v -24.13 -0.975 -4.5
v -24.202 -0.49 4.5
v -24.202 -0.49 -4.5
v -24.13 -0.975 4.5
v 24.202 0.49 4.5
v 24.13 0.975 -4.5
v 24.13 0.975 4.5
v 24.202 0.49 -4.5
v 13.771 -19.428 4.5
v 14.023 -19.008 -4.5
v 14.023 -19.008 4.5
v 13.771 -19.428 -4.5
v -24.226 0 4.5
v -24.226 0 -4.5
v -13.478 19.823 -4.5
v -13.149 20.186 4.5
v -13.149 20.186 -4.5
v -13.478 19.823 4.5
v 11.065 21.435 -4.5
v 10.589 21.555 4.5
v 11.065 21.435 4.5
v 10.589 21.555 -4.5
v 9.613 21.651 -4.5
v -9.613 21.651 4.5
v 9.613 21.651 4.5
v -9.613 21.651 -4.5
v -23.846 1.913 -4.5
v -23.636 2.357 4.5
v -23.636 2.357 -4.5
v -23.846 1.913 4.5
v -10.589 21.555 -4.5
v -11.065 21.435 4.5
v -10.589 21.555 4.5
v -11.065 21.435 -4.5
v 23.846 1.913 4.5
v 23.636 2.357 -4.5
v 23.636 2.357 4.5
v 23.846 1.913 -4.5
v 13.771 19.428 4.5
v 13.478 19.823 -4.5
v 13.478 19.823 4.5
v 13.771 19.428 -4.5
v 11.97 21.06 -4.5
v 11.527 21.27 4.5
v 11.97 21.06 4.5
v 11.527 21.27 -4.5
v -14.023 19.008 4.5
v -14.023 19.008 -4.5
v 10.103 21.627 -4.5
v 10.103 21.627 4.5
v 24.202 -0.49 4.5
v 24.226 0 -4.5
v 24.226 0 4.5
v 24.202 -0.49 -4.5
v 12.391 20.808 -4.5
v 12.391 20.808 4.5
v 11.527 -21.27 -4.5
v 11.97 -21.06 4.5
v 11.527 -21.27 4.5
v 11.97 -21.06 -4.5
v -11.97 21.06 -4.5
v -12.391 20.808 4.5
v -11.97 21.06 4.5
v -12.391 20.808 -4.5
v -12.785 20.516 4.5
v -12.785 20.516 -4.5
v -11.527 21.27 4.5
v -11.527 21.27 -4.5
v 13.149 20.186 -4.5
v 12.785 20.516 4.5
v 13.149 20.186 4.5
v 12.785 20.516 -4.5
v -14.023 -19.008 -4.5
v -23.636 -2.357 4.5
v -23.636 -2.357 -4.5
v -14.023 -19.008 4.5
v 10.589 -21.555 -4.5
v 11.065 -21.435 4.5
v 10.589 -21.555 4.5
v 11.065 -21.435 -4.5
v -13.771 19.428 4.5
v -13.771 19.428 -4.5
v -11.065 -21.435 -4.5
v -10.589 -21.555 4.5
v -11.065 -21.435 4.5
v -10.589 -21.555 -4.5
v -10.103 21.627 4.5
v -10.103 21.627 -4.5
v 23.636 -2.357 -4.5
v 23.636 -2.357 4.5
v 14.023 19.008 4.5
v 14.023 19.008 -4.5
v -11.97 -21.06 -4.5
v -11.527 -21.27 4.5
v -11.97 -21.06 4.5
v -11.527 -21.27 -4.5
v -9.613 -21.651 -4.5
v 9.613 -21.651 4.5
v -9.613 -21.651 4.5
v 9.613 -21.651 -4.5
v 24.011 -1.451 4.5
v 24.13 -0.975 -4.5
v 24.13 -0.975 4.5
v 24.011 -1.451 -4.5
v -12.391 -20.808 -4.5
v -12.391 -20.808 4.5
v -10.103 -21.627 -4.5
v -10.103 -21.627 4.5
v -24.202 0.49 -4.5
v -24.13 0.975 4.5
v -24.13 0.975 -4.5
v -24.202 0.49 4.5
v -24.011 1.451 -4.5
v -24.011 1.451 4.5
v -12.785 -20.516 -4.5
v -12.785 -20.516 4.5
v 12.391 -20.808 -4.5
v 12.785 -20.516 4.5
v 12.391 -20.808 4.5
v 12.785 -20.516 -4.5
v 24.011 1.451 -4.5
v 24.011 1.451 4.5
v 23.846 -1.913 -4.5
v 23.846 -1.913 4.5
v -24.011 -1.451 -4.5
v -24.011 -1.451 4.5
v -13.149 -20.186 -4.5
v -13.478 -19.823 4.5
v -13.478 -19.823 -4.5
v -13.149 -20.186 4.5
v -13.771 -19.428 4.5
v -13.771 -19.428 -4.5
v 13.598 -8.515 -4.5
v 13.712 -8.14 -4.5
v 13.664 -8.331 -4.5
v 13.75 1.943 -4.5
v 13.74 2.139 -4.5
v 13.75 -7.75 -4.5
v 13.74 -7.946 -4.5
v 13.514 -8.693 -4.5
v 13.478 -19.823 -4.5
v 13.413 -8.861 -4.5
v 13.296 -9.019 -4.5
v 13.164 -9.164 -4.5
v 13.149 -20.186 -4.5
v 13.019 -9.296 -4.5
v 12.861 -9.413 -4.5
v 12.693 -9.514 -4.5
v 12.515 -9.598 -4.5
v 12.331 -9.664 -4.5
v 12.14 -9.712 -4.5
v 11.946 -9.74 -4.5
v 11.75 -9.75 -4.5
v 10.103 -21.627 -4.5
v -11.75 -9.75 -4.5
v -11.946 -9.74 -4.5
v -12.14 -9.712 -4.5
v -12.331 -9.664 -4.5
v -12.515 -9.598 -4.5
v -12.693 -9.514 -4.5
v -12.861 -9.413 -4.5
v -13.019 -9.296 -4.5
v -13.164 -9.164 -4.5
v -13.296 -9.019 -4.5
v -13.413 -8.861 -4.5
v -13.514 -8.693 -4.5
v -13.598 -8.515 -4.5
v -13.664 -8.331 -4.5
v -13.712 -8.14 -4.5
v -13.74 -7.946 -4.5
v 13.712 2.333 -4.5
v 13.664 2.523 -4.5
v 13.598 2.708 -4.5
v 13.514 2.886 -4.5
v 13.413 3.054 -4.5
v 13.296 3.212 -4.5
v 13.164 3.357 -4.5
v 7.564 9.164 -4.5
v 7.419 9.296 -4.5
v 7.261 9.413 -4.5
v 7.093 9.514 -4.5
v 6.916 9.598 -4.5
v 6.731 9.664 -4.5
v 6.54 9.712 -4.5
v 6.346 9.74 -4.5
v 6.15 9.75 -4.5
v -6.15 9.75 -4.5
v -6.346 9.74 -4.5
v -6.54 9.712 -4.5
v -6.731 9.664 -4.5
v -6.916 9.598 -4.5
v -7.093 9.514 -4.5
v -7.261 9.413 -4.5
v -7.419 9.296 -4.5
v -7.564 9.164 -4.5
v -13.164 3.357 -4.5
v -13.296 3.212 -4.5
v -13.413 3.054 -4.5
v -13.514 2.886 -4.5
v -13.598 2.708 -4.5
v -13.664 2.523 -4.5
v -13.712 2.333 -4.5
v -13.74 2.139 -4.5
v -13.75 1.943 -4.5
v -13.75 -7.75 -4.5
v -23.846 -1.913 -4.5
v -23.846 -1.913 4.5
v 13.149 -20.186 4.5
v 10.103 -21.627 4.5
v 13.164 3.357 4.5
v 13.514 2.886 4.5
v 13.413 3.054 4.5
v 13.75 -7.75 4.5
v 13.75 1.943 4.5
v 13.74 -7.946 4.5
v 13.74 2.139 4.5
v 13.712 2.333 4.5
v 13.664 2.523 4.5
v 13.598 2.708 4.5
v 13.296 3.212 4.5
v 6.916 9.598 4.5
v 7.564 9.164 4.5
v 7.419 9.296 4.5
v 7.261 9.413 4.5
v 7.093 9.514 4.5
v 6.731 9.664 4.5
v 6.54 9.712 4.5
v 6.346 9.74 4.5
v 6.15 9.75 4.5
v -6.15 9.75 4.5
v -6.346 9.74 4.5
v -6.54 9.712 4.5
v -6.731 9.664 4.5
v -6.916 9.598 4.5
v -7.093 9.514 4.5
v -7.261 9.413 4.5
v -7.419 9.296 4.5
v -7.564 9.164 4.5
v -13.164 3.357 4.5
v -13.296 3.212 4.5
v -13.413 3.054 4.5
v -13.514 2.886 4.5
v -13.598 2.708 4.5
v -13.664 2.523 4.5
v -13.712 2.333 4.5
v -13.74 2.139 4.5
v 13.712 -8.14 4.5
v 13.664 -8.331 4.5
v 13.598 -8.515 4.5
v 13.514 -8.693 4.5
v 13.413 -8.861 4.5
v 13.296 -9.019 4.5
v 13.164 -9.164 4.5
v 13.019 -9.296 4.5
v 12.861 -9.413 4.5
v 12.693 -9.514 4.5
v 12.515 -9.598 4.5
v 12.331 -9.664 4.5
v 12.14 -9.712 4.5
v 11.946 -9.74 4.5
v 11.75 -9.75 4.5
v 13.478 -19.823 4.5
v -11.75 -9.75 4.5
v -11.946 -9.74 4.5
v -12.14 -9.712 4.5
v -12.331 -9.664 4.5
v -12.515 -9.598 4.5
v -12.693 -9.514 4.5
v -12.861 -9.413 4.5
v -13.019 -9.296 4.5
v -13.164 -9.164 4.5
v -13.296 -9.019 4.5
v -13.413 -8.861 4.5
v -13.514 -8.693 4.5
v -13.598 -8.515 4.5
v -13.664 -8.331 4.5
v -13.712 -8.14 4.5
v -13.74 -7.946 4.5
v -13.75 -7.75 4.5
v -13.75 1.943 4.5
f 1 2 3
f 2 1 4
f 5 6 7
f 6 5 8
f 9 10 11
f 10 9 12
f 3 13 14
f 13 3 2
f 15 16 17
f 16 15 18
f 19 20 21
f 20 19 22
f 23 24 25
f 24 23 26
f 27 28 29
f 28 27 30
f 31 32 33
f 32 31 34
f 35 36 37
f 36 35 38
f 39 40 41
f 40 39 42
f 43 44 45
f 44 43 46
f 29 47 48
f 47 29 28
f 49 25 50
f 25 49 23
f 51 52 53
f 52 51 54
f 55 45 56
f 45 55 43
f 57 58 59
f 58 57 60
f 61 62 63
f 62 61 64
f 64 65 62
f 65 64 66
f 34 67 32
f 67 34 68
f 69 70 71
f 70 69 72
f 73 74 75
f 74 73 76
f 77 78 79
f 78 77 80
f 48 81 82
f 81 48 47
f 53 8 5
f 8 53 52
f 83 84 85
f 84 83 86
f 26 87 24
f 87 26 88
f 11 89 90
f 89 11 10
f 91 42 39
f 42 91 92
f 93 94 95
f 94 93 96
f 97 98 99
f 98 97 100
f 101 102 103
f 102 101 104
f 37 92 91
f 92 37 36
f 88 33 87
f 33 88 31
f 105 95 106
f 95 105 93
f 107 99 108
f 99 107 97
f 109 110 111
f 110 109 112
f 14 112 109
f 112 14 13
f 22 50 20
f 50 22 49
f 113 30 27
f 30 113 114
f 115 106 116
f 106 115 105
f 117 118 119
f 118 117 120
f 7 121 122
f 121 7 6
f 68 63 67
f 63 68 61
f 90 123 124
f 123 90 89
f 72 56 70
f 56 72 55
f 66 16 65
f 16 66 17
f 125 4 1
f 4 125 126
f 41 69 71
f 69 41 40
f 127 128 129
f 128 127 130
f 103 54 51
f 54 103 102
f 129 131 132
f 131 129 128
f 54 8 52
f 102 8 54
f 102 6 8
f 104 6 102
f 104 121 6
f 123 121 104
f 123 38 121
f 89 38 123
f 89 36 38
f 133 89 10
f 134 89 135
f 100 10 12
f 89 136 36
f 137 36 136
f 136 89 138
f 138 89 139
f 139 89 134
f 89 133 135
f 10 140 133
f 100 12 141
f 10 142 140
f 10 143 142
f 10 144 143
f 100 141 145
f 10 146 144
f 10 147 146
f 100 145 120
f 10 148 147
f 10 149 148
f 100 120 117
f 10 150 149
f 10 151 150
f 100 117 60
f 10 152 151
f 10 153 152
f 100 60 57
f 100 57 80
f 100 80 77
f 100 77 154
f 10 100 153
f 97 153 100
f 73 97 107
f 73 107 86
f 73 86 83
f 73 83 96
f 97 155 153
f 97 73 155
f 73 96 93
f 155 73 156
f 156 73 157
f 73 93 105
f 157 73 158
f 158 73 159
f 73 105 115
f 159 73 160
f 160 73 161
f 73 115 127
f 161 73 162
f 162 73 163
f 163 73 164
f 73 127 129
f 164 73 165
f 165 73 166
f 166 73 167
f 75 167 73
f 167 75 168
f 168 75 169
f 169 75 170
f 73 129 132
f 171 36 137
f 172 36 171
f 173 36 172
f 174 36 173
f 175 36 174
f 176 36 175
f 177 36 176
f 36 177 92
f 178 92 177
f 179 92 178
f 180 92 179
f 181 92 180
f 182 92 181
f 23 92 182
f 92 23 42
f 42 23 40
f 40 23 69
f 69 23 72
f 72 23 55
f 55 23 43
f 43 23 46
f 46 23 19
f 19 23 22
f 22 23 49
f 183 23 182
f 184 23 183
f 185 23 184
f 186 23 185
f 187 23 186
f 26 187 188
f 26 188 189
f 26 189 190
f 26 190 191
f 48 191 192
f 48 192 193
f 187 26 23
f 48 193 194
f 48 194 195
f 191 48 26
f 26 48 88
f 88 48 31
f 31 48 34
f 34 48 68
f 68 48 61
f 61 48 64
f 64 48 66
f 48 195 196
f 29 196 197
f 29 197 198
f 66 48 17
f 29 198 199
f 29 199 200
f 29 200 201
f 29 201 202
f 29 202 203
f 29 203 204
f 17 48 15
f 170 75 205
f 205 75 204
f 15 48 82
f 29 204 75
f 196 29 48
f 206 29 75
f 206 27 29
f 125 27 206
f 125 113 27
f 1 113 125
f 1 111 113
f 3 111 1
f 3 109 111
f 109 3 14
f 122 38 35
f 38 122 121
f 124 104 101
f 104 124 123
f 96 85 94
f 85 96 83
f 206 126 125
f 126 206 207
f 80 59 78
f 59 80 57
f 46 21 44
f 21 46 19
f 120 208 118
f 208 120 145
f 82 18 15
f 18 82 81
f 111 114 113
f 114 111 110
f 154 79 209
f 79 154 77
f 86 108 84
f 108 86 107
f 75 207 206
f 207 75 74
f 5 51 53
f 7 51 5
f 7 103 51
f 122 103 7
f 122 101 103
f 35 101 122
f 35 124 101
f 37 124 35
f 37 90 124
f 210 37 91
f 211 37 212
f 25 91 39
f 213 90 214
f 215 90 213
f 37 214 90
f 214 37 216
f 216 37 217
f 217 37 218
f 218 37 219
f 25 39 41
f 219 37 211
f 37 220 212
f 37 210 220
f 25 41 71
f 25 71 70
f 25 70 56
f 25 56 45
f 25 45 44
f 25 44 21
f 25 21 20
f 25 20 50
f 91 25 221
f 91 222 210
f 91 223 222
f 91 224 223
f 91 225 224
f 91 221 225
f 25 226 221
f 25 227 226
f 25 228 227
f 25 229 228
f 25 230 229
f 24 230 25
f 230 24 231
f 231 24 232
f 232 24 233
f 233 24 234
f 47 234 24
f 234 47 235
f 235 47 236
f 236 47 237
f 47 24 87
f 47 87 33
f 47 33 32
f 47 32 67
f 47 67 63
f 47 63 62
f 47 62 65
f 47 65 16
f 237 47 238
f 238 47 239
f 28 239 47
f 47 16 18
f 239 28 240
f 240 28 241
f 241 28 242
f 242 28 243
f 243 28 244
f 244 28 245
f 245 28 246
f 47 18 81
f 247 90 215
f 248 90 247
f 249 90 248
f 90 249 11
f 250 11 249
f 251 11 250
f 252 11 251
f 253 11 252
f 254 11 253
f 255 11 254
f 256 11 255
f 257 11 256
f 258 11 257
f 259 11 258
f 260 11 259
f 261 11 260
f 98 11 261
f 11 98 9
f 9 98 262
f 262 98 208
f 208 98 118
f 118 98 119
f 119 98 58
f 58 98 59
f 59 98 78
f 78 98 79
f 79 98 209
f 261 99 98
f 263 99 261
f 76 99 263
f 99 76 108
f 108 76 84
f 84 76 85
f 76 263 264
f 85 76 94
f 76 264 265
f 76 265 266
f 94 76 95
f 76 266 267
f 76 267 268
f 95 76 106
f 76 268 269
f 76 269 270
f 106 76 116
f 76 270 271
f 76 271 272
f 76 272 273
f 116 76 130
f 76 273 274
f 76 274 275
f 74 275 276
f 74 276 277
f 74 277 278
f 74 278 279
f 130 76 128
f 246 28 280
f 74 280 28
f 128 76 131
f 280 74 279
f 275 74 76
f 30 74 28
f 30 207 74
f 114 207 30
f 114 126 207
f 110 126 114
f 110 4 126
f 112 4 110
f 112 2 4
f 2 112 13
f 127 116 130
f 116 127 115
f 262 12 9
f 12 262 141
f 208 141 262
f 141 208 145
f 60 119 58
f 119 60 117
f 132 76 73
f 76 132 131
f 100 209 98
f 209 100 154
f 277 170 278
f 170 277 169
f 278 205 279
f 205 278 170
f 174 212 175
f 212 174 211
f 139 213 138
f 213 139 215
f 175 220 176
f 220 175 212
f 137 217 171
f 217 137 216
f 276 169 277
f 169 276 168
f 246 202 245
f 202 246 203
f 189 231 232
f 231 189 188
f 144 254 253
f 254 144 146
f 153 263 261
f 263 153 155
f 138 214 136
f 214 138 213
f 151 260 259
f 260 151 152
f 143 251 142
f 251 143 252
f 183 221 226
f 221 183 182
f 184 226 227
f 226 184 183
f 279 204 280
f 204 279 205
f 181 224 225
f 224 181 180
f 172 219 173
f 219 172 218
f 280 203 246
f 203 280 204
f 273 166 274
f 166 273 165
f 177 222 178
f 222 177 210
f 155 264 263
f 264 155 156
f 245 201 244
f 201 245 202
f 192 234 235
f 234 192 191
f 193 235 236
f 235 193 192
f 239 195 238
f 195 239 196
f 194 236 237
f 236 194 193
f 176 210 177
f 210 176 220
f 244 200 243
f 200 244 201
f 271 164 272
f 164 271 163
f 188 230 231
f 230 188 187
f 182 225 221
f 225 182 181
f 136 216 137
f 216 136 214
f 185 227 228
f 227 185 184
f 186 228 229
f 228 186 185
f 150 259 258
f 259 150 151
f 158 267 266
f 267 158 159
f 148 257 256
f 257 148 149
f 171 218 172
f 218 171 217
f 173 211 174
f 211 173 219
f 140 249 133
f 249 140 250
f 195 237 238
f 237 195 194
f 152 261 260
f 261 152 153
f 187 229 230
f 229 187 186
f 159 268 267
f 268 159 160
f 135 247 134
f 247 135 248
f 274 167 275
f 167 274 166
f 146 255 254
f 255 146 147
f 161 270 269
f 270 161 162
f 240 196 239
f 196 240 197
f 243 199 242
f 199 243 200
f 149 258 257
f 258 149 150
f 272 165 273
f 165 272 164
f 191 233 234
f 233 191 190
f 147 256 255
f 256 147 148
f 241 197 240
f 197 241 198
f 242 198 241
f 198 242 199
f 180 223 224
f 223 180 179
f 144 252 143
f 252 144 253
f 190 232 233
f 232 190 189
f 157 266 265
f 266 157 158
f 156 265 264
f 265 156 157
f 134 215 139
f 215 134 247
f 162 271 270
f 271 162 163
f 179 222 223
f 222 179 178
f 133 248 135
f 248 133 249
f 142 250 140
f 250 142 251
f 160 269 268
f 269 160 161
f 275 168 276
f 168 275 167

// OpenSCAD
//---------------------------------------------------------------
//-- Openscad Rounded poligon used in Cool PCB Enclosure (http://www.thingiverse.com/thing:1665075).
//-- This is an alternative of offset and or minkowski funcions.
//-- IMPORTANT NOTES:
//--   + The coordinate system is mostly center based in order to simplify the integration between different projects involved.
//-- Version: 1.0
//-- Jul-2016
//---------------------------------------------------------------
//-- Released under the GPL3 license
//---------------------------------------------------------------


//---------------------------------------------------------------
//-- MODULES
//---------------------------------------------------------------

module rounded_polig4(box, radius)
{
    length = box[0];
    width = box[1];
    height = box[2];
	vertices = square_vertices(height, width);
    
    A = vertices[0];
	B = vertices[1];
	C = vertices[2];
	D = vertices[3];

	rotate([0, 90, 90]) translate([0, 0, -length/2]) linear_extrude(height = length, $fn = 64)
	hull()
	{
		// place 4 circles in the corners, with the given radius
		translate(roundvertex(A, B, C, radius)) circle(r = radius, center = true);
		translate(roundvertex(B, C, D, radius)) circle(r = radius, center = true);
		translate(roundvertex(C, D, A, radius)) circle(r = radius, center = true);
		translate(roundvertex(D, A, B, radius)) circle(r = radius, center = true);
	}
}


// polig6 - [x,y,z]
// radius - radius of corners
module rounded_polig6(polig6, height, radius)
{
	A = polig6[0];
	B = polig6[1];
	C = polig6[2];
	D = polig6[3];
	E = polig6[4];
	F = polig6[5];

	linear_extrude(height = height, center= true, $fn = 64)
	hull()
	{
		// place 4 circles in the corners, with the given radius
		translate(roundvertex(A, B, C, radius)) circle(r = radius, center = true);
		translate(roundvertex(B, C, D, radius)) circle(r = radius, center = true);
		translate(roundvertex(C, D, E, radius)) circle(r = radius, center = true);
		translate(roundvertex(D, E, F, radius)) circle(r = radius, center = true);
		translate(roundvertex(E, F, A, radius)) circle(r = radius, center = true);
		translate(roundvertex(F, A, B, radius)) circle(r = radius, center = true);
	}
}



function square_vertices(x, y) = [[-x/2, -y/2, 0], [-x/2, y/2, 0], [x/2, y/2, 0], [x/2, -y/2, 0]];

function trapezoid_vertex(long_base, height, short_base, base_height) = [[-long_base/2, -height/2, 0], [-long_base/2, - height/2 + base_height, 0], [-short_base/2, height/2, 0], [short_base/2, height/2, 0], [long_base/2, - height/2 + base_height, 0], [long_base/2, -height/2, 0]];

function hexagon_vertices(r) = [[r * cos(2 * 180 * 0 / 6), r * sin(2 * 180 * 0/6), 0], [r * cos(2 * 180 * 1/6), r * sin(2 * 180 * 1/6), 0], [r * cos(2 * 180 * 2/6), r * sin(2 * 180 * 2/6), 0], [r * cos(2 * 180 * 3/6), r * sin(2 * 180 * 3/6), 0], [r * cos(2 * 180 * 4/6), r * sin(2 * 180 * 4/6), 0], [r * cos(2 * 180 * 5/6), r * sin(2 * 180 * 5/6), 0]];

//translate([-30, -30, 0]) rotate([90, 0, 90]) rounded_polig6(trapezoid_vertex(27.5, 19.4, 14, 12.4), 10, 2);
//translate([-30, -30, 0]) rotate([90, 0, 90]) rounded_polig6(hexagon_vertices(20), 10, 5);


//----------------------------------------
//-- FUNCTIONS FOR WORKING WITH VECTORS
//----------------------------------------

//-- Calculate the module of a vector
function mod(v) = (sqrt(v[0]*v[0]+v[1]*v[1]+v[2]*v[2]));

//-- Calculate the cros product of two vectors
function cross(u,v) = [
  u[1]*v[2] - v[1]*u[2],
  -(u[0]*v[2] - v[0]*u[2]) ,
  u[0]*v[1] - v[0]*u[1]];

//-- Calculate the dot product of two vectors
function dot(u,v) = u[0]*v[0]+u[1]*v[1]+u[2]*v[2];

//-- Return the unit vector of a vector
function unitv(v) = v/mod(v);

//-- Return the angle between two vectores
function anglev(u, v) = acos( dot(u,v) / (mod(u)*mod(v)) );

function distance(u, v) = mod(v - u);

function incenter(A, B, C) = (A * distance(B, C) + B * distance(C, A) + C * distance(A, B)) / (distance(B, C) + distance(C, A) + distance(A, B));

function roundvertex(A, B, C, r) = B + (unitv(incenter(A, B, C) - B) * r / sin(anglev(B - A, B - C)/2)); 



//---------------------------------------------------------------
//-- RENDERS
//---------------------------------------------------------------

difference(){
    rounded_polig6(hexagon_vertices(r = 25), 8 + 1, 5);  
    rounded_polig6(trapezoid_vertex(27.5, 19.5, 14, 12.5), 10, 2);
}      
